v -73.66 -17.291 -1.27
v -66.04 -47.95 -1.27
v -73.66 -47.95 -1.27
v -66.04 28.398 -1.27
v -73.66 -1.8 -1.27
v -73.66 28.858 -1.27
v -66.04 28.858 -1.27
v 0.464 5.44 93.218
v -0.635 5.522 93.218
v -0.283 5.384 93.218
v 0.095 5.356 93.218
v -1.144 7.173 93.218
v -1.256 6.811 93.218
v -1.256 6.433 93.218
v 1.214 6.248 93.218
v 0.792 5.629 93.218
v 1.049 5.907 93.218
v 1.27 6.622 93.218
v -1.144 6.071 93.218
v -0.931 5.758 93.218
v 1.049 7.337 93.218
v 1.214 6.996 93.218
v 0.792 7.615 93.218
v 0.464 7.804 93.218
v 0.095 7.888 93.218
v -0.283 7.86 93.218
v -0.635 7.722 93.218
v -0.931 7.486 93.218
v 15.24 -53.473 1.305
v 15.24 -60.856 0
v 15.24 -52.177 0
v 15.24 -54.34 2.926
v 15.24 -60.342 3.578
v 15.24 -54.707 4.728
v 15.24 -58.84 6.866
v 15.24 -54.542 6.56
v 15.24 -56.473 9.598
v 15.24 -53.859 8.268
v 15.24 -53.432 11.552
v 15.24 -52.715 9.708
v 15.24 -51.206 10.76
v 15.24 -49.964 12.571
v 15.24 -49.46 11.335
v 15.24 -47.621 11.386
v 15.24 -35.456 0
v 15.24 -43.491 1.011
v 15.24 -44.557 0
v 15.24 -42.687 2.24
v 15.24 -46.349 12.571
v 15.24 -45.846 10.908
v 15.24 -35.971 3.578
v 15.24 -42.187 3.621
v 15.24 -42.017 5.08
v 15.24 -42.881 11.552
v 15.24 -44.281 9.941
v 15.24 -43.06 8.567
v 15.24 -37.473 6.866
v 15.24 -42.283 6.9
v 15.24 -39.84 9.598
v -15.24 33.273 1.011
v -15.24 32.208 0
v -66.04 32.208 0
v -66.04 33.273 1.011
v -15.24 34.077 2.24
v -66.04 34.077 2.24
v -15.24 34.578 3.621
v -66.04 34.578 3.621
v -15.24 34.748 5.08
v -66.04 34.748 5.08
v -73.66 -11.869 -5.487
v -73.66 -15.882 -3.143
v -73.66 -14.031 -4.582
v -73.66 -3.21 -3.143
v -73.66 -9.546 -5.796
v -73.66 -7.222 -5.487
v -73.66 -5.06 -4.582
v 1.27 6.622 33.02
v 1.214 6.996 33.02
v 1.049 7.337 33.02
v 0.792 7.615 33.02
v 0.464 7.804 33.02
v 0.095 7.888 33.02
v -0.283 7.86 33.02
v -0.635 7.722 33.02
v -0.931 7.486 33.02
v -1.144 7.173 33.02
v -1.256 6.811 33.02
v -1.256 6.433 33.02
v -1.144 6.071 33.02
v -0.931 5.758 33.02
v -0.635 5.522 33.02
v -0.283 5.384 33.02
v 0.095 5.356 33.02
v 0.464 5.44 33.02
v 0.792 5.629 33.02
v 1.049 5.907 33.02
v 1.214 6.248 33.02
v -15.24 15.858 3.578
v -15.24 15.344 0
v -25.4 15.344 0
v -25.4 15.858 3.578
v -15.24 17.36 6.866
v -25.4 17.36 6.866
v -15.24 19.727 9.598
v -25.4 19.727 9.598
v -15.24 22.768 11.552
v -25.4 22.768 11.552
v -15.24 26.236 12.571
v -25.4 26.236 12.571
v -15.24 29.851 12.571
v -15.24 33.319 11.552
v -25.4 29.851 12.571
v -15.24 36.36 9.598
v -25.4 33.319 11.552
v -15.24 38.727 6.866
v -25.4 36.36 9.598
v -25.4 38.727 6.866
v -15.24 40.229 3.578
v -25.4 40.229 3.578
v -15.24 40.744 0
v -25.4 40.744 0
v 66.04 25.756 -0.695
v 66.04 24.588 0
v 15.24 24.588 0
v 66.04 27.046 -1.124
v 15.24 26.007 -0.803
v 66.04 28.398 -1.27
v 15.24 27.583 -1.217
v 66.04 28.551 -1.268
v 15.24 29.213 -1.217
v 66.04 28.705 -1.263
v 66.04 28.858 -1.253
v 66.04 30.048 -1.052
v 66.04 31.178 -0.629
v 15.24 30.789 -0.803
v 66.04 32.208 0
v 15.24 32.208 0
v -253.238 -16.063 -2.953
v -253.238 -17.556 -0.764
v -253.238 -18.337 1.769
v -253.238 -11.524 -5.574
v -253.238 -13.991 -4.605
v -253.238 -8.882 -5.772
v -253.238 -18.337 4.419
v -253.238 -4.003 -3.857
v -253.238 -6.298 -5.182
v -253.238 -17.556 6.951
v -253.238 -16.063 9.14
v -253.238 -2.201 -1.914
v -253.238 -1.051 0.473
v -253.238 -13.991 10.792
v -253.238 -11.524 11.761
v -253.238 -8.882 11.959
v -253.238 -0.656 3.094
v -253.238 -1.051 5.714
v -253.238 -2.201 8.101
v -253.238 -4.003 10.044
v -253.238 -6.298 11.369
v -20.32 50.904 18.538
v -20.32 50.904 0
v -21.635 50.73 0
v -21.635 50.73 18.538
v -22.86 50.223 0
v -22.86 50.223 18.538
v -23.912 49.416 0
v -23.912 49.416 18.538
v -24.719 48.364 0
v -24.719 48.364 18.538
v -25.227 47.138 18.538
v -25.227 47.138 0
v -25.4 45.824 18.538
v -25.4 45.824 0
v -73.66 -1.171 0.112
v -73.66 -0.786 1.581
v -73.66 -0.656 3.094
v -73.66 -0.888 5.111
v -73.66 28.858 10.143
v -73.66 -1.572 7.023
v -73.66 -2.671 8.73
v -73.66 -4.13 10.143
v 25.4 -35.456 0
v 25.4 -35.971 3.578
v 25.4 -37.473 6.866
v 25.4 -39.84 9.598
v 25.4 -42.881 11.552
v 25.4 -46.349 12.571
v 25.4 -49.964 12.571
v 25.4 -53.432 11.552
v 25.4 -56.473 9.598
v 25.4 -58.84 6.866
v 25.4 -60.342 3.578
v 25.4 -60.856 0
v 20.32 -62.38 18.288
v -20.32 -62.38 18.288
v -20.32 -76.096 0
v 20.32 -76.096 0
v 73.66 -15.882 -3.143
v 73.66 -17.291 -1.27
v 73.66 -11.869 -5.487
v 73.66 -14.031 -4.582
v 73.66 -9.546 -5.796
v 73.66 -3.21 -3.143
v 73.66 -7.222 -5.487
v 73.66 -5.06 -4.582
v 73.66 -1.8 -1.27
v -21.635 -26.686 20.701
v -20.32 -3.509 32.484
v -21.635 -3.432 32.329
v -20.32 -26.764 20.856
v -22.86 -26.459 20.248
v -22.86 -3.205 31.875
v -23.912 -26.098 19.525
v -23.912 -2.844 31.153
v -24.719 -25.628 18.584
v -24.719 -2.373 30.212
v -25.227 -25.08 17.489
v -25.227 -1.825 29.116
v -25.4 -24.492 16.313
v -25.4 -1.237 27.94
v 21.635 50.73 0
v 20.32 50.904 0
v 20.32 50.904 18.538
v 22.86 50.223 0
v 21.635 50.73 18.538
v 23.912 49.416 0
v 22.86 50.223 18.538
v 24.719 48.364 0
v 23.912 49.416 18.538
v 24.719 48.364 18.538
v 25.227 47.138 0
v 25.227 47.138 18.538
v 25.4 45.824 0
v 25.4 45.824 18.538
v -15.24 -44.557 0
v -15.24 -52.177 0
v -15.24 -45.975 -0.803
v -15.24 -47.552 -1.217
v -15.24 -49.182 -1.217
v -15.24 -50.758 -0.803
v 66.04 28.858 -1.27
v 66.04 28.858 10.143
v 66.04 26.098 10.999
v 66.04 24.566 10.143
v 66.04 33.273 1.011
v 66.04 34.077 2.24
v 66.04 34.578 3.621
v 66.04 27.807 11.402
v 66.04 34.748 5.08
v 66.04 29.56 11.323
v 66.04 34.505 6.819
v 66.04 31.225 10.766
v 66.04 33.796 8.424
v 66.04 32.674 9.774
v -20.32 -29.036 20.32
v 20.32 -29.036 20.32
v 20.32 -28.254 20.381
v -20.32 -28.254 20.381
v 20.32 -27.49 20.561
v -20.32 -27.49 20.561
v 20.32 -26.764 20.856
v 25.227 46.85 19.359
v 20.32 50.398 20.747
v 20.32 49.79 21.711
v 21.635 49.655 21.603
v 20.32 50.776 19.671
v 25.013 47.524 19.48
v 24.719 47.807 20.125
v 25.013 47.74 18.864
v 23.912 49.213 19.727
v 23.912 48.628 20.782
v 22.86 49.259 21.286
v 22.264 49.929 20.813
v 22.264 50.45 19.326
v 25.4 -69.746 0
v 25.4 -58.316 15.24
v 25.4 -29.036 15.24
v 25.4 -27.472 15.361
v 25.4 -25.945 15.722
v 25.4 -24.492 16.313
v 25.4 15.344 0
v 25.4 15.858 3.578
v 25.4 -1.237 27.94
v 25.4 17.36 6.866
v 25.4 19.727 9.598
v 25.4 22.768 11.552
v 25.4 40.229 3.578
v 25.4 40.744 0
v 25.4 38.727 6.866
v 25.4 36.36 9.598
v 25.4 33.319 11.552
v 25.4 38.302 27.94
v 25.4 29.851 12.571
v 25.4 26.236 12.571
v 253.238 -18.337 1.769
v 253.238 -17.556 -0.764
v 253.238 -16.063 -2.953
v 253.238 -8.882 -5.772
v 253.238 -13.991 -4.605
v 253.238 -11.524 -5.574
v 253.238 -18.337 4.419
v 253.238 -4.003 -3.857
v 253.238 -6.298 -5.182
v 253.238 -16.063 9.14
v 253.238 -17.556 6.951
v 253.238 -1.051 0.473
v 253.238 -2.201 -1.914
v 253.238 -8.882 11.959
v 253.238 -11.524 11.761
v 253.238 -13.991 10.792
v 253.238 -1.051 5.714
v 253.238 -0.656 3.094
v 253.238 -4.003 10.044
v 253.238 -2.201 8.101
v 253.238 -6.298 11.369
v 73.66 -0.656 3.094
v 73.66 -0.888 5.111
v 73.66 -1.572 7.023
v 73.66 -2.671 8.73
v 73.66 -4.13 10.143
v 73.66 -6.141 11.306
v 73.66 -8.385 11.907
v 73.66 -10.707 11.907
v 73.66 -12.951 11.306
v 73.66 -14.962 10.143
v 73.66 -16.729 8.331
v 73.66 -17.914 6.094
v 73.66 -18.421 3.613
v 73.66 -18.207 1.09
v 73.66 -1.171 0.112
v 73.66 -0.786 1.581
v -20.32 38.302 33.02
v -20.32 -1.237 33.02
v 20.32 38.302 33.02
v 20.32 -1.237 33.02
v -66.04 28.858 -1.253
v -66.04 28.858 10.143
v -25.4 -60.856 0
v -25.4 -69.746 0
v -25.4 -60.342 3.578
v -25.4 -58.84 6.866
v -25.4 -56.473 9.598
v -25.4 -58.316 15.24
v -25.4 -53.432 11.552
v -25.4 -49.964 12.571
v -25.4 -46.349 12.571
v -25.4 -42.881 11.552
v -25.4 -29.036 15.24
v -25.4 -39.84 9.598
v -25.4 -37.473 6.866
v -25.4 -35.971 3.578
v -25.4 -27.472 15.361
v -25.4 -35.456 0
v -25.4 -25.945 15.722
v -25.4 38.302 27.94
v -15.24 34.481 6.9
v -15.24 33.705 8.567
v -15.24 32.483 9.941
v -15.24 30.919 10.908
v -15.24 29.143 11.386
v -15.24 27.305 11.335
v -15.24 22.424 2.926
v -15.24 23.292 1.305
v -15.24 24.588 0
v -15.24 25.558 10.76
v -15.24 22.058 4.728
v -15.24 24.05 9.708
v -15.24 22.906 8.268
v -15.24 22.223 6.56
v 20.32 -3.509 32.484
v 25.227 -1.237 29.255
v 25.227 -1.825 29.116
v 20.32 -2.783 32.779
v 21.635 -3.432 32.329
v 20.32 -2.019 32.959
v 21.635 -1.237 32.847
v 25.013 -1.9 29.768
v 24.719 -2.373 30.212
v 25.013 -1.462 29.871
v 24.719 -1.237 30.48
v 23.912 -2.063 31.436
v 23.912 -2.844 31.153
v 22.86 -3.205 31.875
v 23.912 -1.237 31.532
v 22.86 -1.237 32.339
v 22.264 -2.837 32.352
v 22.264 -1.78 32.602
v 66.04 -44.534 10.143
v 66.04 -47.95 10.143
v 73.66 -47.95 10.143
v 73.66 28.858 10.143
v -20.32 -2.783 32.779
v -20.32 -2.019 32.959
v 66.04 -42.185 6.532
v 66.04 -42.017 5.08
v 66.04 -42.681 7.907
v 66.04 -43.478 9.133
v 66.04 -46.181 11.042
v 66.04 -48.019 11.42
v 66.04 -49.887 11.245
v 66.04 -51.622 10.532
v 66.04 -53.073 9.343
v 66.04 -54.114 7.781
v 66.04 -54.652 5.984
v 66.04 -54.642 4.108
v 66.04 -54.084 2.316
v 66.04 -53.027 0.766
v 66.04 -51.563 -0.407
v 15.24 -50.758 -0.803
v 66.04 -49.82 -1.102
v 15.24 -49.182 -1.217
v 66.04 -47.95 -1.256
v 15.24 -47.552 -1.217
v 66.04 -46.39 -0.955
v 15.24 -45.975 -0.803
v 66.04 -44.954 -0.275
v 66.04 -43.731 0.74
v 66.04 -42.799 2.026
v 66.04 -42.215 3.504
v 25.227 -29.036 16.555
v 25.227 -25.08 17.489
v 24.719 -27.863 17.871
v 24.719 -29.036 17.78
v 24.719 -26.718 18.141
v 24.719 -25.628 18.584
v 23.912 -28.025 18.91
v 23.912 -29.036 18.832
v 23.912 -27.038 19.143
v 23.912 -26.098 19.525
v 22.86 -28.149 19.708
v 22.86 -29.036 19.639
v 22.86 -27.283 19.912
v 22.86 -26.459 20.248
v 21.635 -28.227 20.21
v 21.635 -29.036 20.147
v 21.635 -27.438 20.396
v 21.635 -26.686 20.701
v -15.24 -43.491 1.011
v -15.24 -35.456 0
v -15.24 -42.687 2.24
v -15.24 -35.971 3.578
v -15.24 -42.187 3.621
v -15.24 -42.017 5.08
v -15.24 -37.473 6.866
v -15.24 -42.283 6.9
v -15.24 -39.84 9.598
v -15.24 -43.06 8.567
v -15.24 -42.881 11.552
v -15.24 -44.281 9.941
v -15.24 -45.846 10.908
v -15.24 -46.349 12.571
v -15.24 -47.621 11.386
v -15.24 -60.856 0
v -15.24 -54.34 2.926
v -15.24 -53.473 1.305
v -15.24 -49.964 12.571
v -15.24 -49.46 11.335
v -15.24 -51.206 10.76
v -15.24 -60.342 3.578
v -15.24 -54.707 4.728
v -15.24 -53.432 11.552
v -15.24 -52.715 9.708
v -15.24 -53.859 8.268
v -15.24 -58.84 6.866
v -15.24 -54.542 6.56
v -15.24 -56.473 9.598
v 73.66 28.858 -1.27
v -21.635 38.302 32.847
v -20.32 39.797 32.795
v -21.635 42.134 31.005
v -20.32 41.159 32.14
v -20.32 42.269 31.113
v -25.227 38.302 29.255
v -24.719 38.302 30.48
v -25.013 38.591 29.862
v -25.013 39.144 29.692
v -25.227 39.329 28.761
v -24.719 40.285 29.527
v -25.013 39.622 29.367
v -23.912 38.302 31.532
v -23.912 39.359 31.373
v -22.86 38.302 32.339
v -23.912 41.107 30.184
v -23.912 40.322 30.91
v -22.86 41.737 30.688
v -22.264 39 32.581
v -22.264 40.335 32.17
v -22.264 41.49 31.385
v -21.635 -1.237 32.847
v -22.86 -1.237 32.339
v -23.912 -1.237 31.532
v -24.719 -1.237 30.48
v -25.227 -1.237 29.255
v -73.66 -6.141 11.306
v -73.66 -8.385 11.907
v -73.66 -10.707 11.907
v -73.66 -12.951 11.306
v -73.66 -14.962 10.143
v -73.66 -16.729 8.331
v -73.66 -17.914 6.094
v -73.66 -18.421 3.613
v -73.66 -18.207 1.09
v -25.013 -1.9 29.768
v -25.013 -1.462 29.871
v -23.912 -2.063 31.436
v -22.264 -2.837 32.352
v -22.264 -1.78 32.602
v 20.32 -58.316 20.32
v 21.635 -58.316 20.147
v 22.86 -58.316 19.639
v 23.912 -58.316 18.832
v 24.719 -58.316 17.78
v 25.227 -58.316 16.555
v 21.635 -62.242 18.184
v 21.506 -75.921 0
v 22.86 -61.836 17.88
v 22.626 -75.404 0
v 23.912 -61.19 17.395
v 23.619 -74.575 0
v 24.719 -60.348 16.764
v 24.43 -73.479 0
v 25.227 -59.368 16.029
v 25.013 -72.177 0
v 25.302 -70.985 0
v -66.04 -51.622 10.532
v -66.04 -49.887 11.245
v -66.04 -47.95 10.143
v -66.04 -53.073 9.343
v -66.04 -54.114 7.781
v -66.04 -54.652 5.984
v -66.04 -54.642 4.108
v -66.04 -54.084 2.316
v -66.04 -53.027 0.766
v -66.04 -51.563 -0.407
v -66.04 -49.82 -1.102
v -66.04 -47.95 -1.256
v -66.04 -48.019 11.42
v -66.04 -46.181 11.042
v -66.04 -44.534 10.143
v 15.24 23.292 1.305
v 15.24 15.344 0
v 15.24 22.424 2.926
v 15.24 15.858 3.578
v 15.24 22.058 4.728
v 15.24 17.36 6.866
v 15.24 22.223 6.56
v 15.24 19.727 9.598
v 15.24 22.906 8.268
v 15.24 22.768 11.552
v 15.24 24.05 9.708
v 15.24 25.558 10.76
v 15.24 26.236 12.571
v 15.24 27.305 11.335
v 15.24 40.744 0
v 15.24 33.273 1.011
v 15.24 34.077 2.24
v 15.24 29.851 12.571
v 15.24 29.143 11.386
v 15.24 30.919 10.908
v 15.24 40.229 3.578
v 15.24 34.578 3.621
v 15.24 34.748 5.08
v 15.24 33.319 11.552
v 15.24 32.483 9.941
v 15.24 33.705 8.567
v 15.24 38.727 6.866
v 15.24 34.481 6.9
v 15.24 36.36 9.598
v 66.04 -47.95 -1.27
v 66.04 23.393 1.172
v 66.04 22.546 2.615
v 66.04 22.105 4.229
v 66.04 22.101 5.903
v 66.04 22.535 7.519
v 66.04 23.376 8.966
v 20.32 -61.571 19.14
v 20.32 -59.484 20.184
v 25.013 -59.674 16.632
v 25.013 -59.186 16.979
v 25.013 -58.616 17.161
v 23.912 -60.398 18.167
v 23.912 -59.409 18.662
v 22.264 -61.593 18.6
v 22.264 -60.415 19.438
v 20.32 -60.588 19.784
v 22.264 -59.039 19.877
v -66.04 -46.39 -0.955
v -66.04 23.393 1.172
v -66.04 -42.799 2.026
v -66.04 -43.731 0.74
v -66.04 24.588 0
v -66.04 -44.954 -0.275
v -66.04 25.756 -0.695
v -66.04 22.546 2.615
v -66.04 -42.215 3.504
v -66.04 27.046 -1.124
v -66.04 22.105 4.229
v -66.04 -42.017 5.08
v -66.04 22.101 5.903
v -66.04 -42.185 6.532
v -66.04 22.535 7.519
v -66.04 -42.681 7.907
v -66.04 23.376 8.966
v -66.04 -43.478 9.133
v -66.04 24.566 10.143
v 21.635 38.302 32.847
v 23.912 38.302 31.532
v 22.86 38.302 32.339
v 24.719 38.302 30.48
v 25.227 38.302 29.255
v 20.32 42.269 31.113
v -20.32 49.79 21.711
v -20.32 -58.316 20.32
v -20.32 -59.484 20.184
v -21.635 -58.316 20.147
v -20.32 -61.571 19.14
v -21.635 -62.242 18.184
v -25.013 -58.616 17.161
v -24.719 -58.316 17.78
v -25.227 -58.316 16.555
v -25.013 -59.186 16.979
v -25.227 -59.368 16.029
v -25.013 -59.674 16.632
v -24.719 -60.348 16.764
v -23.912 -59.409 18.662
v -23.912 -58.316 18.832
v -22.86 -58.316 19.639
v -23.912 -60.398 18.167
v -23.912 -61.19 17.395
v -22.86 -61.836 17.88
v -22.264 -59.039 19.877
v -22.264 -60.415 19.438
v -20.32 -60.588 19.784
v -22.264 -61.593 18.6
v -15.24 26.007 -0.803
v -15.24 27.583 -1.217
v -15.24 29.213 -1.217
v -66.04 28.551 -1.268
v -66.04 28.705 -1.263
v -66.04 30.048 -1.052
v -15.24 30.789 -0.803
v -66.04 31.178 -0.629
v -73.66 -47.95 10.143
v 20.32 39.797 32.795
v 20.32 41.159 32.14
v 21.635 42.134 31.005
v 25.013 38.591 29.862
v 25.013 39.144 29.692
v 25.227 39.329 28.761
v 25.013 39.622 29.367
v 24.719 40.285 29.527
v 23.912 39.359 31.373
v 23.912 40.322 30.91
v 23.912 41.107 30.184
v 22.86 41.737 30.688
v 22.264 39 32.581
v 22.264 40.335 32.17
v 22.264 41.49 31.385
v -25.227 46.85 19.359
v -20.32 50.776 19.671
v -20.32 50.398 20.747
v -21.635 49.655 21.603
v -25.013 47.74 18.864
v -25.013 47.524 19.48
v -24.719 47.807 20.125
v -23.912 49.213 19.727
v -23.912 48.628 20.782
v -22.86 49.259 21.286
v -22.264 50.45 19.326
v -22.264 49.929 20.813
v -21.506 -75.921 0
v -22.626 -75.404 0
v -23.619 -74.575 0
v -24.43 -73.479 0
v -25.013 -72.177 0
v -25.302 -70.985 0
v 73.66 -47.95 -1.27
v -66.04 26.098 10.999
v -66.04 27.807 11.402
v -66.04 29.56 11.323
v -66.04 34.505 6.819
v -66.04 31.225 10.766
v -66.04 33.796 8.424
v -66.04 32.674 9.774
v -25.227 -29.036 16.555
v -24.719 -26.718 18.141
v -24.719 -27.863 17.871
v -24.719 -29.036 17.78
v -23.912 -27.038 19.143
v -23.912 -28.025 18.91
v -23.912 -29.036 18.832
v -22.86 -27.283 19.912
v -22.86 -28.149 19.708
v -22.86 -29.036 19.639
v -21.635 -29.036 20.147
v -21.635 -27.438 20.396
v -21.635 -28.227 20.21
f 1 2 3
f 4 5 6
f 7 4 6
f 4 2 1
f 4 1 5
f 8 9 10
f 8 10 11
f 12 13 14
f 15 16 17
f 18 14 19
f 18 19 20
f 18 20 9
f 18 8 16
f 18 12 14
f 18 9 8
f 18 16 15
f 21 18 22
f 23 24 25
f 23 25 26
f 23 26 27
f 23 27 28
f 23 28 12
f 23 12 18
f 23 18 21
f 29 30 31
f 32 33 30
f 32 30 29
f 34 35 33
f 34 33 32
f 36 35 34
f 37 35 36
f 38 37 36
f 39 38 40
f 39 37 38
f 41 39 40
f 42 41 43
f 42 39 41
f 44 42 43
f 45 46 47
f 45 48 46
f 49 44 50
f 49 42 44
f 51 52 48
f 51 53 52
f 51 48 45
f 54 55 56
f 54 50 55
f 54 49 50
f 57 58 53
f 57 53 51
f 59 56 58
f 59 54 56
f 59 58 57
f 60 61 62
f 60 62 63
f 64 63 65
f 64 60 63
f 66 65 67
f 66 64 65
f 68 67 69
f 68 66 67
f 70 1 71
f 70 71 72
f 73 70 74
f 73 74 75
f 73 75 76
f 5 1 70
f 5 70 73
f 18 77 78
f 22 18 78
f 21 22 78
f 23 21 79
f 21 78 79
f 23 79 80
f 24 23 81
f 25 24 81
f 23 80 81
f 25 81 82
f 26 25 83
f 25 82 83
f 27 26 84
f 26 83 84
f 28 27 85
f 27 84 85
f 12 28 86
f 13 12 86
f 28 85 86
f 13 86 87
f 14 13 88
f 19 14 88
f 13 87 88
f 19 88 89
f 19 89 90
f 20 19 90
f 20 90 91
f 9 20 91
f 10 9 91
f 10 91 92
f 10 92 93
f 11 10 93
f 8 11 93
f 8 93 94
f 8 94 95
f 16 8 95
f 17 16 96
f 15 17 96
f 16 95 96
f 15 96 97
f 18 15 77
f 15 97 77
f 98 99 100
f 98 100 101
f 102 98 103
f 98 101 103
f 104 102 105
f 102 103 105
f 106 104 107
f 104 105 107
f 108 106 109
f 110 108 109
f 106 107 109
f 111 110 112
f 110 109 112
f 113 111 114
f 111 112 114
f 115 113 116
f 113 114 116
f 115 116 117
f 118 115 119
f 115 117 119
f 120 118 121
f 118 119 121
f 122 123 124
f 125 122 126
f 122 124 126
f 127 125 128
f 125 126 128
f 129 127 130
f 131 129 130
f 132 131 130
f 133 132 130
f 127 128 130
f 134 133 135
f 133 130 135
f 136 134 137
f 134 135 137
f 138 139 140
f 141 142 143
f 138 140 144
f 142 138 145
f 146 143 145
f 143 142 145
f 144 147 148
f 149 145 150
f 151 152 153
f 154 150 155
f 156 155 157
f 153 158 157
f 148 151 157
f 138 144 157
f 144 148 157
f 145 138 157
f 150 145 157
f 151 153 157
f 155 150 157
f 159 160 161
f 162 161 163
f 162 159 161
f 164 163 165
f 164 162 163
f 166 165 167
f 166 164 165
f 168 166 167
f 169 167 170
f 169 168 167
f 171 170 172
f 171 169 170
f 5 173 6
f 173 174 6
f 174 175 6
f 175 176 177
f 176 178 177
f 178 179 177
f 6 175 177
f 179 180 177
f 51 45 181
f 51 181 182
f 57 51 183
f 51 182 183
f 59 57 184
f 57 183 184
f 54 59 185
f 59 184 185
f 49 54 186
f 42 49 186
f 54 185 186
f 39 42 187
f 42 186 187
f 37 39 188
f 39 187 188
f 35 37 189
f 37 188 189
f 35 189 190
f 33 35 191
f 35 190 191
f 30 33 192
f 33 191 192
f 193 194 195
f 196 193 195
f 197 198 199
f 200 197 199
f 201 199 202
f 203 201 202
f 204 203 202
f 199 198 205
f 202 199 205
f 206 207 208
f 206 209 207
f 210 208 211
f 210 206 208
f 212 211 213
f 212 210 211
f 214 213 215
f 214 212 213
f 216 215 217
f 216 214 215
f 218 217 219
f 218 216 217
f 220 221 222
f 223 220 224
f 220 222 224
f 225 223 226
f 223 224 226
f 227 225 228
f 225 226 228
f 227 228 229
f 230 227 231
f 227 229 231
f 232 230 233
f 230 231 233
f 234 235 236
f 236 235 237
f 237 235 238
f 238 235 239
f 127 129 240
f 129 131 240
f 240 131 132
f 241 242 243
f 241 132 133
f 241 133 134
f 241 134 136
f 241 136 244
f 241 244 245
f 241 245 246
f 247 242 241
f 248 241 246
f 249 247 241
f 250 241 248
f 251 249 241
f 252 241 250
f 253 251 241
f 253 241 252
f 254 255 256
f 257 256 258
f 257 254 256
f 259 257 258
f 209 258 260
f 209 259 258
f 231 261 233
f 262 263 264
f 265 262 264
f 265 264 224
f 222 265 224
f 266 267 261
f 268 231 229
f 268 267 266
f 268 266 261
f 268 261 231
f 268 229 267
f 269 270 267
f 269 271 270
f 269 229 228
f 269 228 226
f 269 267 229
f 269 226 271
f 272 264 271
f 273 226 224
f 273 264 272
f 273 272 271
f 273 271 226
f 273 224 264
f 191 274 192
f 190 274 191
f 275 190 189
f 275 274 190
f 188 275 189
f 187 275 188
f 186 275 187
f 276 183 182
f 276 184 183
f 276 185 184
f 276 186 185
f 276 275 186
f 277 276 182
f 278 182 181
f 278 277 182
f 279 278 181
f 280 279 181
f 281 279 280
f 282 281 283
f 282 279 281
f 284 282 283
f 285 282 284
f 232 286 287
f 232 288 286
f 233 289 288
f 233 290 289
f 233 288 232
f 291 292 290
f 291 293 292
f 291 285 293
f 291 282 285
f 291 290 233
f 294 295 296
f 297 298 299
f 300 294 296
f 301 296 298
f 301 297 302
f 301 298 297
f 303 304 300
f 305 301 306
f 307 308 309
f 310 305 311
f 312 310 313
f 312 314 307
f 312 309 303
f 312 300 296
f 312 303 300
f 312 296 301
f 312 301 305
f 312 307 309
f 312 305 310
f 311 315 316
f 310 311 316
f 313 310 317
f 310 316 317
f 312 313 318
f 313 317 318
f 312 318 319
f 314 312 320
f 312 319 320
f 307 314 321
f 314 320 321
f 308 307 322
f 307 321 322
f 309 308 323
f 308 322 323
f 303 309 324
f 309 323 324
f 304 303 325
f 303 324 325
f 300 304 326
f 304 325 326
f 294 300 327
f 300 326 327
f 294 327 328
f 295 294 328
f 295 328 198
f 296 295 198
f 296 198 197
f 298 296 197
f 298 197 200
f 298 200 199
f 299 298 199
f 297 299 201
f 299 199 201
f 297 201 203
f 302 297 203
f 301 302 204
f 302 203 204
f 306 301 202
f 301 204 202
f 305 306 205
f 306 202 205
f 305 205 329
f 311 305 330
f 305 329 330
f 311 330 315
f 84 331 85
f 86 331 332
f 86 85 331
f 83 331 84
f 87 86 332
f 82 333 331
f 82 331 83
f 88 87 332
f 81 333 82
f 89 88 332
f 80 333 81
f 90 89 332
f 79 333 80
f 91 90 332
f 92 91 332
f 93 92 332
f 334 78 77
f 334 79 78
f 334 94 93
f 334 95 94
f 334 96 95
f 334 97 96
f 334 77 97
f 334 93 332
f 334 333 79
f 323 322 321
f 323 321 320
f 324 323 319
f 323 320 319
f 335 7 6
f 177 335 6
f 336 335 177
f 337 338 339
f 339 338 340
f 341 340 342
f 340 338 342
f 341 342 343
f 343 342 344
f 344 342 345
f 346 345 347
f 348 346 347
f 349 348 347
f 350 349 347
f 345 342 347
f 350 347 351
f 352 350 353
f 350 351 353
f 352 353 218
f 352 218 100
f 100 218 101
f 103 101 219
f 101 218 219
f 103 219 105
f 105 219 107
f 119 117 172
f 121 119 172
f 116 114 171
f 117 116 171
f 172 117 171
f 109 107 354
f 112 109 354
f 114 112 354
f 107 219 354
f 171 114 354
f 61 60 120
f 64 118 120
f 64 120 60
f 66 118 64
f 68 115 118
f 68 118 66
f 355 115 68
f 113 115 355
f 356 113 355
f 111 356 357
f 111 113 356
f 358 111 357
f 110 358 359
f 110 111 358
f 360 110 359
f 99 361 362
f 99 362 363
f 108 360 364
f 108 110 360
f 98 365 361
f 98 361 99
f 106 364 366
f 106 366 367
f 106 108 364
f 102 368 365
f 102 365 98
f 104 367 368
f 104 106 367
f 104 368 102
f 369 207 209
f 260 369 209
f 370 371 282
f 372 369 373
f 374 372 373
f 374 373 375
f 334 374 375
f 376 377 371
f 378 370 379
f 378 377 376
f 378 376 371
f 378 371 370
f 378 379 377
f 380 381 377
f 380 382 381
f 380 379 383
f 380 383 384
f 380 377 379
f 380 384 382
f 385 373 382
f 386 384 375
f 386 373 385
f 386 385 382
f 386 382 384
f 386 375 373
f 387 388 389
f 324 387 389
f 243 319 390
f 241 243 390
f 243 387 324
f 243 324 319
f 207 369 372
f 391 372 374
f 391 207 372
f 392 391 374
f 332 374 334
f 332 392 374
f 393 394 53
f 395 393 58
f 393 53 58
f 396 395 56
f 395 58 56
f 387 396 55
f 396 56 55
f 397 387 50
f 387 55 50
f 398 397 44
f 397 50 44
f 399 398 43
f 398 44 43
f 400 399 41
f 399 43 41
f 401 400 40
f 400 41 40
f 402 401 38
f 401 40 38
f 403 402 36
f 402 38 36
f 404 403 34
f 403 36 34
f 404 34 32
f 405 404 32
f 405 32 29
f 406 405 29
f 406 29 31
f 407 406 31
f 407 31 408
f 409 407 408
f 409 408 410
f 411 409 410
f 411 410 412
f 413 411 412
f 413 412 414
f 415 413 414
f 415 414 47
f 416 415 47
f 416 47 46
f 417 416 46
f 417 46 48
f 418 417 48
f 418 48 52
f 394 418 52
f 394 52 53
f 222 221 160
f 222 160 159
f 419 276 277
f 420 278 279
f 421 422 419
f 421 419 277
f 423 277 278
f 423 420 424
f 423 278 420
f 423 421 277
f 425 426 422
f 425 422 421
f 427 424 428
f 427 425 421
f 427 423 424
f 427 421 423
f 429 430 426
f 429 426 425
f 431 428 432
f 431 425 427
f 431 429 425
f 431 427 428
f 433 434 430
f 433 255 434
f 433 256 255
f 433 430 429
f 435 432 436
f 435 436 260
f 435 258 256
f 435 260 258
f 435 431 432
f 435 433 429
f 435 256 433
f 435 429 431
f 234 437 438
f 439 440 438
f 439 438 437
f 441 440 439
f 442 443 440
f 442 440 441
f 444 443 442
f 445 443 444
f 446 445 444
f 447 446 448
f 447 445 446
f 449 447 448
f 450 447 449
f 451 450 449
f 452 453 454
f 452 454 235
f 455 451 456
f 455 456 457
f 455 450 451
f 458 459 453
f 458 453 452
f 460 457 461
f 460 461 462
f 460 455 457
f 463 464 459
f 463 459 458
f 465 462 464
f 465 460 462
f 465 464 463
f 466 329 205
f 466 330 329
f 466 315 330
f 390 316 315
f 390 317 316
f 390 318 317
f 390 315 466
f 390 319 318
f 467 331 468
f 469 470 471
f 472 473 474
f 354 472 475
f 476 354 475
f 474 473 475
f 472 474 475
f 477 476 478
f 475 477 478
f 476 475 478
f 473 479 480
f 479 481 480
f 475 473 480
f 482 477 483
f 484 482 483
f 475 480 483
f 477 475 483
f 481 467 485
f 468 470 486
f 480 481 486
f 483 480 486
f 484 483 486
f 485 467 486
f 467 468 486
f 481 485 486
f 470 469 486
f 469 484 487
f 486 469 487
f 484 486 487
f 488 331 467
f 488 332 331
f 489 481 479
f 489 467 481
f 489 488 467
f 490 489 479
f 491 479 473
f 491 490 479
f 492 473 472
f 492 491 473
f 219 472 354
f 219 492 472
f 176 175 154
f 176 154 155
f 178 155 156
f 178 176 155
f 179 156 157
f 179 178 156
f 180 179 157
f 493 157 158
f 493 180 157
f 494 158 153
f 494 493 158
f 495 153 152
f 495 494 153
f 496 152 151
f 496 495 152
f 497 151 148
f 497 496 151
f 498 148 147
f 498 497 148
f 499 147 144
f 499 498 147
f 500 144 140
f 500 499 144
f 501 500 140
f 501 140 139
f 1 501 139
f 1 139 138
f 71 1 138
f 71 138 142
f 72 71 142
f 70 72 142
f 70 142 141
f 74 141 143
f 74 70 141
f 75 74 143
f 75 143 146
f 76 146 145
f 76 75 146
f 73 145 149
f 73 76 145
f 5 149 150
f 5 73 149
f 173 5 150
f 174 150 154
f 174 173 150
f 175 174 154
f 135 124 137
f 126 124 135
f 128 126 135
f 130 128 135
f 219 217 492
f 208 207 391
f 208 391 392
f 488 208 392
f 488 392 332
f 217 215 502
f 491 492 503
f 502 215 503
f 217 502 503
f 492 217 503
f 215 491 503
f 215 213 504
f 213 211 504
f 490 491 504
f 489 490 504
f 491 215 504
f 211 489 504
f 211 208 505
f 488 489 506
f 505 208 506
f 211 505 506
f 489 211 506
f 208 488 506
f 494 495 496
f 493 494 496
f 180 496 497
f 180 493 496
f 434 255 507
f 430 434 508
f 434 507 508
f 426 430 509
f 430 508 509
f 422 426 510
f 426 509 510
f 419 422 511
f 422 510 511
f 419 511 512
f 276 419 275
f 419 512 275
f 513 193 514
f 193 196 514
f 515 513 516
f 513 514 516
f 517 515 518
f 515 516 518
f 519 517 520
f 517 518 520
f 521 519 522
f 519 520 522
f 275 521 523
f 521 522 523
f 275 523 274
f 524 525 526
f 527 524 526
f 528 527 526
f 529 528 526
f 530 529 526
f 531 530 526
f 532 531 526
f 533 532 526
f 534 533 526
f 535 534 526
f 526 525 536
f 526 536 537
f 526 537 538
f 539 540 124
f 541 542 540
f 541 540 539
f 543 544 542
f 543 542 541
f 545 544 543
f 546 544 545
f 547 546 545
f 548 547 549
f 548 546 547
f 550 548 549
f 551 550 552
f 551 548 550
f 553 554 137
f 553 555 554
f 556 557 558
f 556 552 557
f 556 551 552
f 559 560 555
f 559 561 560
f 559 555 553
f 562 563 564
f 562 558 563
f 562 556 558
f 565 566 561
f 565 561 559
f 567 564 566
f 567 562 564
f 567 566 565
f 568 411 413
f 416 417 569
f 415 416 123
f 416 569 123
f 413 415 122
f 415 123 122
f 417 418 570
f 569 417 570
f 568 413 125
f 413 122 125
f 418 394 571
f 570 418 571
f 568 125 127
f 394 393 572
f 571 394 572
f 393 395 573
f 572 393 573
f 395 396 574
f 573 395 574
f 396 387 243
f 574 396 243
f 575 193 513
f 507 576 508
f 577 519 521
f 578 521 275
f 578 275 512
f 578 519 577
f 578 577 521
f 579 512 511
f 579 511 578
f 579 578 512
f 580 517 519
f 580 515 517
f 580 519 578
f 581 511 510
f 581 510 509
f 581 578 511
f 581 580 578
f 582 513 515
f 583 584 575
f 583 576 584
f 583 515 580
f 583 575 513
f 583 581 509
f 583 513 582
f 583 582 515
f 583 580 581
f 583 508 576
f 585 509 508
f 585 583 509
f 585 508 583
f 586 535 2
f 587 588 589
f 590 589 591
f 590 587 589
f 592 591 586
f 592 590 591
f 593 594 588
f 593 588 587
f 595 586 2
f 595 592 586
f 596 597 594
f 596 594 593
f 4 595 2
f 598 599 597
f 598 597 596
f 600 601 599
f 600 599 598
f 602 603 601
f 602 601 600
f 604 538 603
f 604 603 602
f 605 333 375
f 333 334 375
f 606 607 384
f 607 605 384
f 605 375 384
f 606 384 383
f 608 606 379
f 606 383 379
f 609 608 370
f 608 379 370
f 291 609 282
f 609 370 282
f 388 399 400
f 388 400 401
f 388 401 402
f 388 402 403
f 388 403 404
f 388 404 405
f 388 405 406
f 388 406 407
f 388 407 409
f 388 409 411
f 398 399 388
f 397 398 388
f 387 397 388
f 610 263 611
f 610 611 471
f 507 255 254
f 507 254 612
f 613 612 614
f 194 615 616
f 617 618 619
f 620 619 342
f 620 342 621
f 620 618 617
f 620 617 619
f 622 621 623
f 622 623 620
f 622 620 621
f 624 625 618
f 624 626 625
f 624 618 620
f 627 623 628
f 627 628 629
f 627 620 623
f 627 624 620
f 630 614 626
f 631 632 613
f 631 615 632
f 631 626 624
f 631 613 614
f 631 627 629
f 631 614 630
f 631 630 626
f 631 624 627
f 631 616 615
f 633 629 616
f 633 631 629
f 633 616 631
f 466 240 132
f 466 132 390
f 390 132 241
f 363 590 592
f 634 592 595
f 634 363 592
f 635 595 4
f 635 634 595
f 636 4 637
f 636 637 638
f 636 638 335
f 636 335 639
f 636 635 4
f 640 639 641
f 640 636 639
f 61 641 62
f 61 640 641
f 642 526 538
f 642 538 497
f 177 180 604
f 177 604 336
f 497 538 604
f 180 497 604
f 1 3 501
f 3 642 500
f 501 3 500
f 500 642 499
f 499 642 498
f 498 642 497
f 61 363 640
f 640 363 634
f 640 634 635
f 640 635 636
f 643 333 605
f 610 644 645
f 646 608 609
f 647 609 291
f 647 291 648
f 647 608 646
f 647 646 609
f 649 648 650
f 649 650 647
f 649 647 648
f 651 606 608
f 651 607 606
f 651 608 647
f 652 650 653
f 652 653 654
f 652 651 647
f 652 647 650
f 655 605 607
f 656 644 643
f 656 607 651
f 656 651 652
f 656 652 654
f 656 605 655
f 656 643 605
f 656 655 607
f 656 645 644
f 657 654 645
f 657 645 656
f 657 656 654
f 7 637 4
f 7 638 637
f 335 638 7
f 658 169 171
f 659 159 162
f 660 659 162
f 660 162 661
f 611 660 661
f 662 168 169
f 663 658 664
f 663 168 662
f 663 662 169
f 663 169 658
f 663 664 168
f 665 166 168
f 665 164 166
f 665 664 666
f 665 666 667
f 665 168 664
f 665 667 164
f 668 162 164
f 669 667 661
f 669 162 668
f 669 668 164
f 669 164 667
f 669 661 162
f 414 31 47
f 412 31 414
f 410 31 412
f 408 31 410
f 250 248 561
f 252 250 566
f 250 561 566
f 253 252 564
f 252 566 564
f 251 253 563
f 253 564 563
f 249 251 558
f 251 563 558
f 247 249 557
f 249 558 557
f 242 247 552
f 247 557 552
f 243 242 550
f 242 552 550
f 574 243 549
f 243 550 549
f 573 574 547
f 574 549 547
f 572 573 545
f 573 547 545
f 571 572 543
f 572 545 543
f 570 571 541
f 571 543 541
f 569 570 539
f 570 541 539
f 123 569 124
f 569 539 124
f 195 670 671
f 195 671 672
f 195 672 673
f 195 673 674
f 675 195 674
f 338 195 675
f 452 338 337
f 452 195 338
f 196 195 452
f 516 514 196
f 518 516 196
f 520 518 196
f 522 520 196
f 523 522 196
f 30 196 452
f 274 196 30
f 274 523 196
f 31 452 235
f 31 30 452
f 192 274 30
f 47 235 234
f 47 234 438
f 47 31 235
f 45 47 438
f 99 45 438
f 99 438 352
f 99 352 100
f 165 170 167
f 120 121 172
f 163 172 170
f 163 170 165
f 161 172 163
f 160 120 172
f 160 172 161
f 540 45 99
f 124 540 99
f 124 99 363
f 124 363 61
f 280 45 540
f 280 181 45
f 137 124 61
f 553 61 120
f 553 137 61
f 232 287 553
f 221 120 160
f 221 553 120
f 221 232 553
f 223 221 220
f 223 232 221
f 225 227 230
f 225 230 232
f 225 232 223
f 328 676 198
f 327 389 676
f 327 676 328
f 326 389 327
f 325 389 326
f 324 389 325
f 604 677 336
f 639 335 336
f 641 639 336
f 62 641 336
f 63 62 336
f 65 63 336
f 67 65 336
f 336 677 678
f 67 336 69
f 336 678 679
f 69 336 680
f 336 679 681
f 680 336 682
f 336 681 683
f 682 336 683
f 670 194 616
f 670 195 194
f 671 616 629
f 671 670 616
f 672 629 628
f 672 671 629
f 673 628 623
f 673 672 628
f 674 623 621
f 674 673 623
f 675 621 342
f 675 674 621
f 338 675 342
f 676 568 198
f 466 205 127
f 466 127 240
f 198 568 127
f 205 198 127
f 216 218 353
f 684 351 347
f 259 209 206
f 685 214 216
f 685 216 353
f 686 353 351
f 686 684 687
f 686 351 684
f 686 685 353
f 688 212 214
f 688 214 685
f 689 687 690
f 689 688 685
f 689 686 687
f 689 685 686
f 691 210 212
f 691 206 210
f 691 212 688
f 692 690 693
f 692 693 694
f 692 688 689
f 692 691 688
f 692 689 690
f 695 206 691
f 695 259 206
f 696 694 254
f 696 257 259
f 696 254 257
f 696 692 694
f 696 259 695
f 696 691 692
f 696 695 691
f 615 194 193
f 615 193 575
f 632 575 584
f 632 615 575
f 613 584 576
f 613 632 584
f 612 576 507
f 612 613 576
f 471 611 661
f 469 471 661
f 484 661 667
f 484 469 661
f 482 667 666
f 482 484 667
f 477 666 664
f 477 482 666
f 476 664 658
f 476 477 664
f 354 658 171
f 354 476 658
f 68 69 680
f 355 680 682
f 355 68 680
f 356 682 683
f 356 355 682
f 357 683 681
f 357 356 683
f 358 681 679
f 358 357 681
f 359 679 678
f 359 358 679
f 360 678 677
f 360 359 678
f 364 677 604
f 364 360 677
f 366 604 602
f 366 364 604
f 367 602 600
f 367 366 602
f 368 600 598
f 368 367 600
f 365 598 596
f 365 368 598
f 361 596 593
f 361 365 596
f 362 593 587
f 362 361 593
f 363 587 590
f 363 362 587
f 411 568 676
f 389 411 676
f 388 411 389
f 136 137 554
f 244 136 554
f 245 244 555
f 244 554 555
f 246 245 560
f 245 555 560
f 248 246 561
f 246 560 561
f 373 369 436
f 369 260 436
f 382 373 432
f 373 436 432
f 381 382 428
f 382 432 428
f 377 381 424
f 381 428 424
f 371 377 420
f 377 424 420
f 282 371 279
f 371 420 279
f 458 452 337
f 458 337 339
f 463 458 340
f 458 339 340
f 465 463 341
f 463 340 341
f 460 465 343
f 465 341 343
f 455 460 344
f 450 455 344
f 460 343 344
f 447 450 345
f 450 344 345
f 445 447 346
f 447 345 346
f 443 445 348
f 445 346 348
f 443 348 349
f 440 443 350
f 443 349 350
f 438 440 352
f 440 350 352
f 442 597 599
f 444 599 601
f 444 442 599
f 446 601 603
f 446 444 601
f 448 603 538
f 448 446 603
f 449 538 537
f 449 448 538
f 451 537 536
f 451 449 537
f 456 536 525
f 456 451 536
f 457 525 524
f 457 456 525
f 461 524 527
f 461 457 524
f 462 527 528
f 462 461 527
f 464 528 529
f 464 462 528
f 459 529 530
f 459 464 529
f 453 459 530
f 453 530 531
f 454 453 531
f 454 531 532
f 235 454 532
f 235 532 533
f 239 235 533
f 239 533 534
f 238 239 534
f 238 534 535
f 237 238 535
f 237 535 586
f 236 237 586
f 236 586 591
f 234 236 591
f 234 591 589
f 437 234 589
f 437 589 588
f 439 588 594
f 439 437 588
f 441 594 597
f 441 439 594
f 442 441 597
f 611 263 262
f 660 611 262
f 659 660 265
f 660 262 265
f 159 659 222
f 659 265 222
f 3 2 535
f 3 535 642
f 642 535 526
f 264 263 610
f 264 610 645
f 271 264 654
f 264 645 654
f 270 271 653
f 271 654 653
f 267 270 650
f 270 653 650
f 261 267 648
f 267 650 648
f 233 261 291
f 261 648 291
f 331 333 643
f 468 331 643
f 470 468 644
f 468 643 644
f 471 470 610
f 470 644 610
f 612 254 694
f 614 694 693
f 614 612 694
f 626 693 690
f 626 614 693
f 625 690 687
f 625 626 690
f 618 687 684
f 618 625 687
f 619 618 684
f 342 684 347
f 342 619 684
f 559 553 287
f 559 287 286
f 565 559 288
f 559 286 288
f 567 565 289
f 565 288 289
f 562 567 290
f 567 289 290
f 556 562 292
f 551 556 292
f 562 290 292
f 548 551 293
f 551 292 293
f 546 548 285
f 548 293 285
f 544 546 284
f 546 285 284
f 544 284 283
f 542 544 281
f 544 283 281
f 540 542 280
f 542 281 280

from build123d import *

# Parameters (mm, degrees)
F1_DEPTH  = 25.4
F2_R      = 5.08
F4_DEPTH  = 10.16
F6_DEPTH  = 10.16
F7_R      = 6.35
F8_DEPTH  = 50.8
F10_W     = 76.8076643543
F10_H     = 11.4133090087
F11_DEPTH = 7.62
F13_R     = 8.89
F14_DEPTH = 179.578
F16_R     = 1.27
F17_DEPTH = 60.198


# Not quite as in the source:
# - a feature names something its author has since deleted; it is built from what else it names


with BuildPart() as f1:
    # F0 (on Right) → F1 (new body, symmetric)
    with BuildSketch(Plane.YZ):
        Polygon((-60.8564667081, 20.32), (-76.0964667081, 0), (50.9035332919, 0), (50.9035332919, 20.32), (40.7435332919, 33.02), (-2.4364667081, 33.02), (-27.8364667081, 20.32), align=None)
    extrude(amount=F1_DEPTH, both=True)

    # F2
    f2_edges = [f1.edges().sort_by_distance(p)[0] for p in [
        (25.4, -68.476467, 10.16),
        (25.4, -44.346467, 20.32),
        (25.4, -15.136467, 26.67),
        (25.4, 19.153533, 33.02),
        (25.4, 45.823533, 26.67),
        (25.4, 50.903533, 10.16),
        (0, 50.903533, 20.32),
        (0, 40.743533, 33.02),
        (0, -60.856467, 20.32),
        (0, -27.836467, 20.32),
        (0, -2.436467, 33.02),
        (-25.4, -15.136467, 26.67),
        (-25.4, -44.346467, 20.32),
        (-25.4, -68.476467, 10.16),
        (-25.4, 19.153533, 33.02),
        (-25.4, 50.903533, 10.16),
        (-25.4, 45.823533, 26.67),
    ]]
    fillet(f2_edges, radius=F2_R)

    # F3 (on face) → F4 (cut)
    with BuildSketch(Plane.YZ.offset(25.4)):
        with BuildLine():
            Line((-60.8564667081, 0), (-35.4564667081, 0))
            ThreePointArc((-35.4564667081, 0), (-48.1564667081, 12.7), (-60.8564667081, 0))
        make_face()
        with BuildLine():
            ThreePointArc((40.7435332919, 0), (28.0435332919, 12.7), (15.3435332919, 0))
            Line((15.3435332919, 0), (40.7435332919, 0))
        make_face()
    extrude(amount=-F4_DEPTH, mode=Mode.SUBTRACT)

    # F5 (on face) → F6 (cut)
    with BuildSketch(Plane(origin=(-25.4, 0, 0), x_dir=(0, -1, 0), z_dir=(-1, 0, 0))):
        with BuildLine():
            Line((-40.7435332919, 0), (-15.3435332919, 0))
            ThreePointArc((-15.3435332919, 0), (-28.0435332919, 12.7), (-40.7435332919, 0))
        make_face()
        with BuildLine():
            Line((35.4564667081, 0), (60.8564667081, 0))
            ThreePointArc((60.8564667081, 0), (48.1564667081, 12.7), (35.4564667081, 0))
        make_face()
    extrude(amount=-F6_DEPTH, mode=Mode.SUBTRACT)

    # F7 (on face) → F8 (join)
    with BuildSketch(Plane.YZ.offset(15.24)):
        with BuildLine():
            Line((32.2078052294, 0), (24.5878052294, 0))
            ThreePointArc((24.5878052294, 0), (28.3978052294, -1.27), (32.2078052294, 0))
        make_face()
        with Locations((-48.3666342305, 5.08)):
            Circle(F7_R)
        with BuildLine():
            ThreePointArc((32.2078052294, 0), (34.0774178922, 2.2401936686), (34.7478052294, 5.08))
            ThreePointArc((34.7478052294, 5.08), (25.5579988979, 10.7596126628), (24.5878052294, 0))
            Line((24.5878052294, 0), (32.2078052294, 0))
        make_face()
    extrude(amount=F8_DEPTH)

    # F9: F1 across plane


with BuildPart() as f1_1:
    add(f1.part)
    add(f1.part.mirror(Plane.YZ))

    # F10 (on face) → F11 (join)
    with BuildSketch(Plane.YZ.offset(66.04)):
        with Locations((-9.5459215246, 4.4366544964)):
            Rectangle(F10_W, F10_H)
    extrude(amount=F11_DEPTH)

    # F12: F1 across plane


with BuildPart() as f1_2:
    add(f1_1.part)
    add(f1_1.part.mirror(Plane.YZ))

    # F13 (on face) → F14 (join)
    with BuildSketch(Plane.YZ.offset(73.66)):
        with Locations((-9.5459241474, 3.0935325194)):
            Circle(F13_R)
    extrude(amount=F14_DEPTH)

    # F15: F1 across plane


with BuildPart() as f1_3:
    add(f1_2.part)
    add(f1_2.part.mirror(Plane.YZ))

    # F16 (on face) → F17 (join)
    with BuildSketch(Plane.XY.offset(33.02)):
        with Locations((0, 6.6220072263)):
            Circle(F16_R)
    extrude(amount=F17_DEPTH)


solid = f1_3.part
